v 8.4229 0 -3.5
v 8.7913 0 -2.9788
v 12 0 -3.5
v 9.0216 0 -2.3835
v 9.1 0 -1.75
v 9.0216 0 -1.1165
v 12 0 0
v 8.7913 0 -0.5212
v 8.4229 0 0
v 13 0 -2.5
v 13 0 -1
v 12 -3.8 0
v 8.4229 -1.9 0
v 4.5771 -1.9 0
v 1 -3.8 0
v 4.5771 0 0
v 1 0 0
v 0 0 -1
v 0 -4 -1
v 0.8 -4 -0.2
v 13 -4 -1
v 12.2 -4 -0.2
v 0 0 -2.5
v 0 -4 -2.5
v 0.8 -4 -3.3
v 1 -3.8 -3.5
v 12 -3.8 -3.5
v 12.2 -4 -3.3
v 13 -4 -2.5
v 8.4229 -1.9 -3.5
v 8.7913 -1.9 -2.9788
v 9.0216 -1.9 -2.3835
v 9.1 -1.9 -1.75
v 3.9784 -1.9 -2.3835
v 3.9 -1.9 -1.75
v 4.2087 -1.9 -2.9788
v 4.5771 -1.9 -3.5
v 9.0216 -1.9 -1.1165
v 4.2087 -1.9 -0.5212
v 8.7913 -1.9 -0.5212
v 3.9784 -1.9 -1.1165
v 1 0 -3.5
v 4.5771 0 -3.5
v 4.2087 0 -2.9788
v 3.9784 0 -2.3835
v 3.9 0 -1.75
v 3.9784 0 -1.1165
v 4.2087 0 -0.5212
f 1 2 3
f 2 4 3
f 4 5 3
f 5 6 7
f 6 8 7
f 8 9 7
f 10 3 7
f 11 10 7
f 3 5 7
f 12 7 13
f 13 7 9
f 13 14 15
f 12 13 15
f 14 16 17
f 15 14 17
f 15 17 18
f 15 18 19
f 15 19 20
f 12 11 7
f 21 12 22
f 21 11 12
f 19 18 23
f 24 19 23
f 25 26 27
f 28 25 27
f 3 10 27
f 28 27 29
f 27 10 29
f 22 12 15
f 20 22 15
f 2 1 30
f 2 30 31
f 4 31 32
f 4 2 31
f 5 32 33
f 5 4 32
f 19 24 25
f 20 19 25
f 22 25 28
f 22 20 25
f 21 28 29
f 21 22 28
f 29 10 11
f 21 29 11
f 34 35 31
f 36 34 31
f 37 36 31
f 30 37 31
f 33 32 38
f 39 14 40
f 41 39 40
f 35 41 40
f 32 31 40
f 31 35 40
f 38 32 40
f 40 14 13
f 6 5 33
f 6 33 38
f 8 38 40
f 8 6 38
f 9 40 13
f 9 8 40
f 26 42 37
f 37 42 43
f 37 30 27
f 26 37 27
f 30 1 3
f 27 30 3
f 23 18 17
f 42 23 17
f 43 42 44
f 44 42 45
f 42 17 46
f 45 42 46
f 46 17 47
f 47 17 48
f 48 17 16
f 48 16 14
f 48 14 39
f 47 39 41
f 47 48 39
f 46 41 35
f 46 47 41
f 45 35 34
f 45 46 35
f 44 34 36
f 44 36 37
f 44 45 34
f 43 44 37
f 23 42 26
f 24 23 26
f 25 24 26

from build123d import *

# Parameters (mm, degrees)
F1_DEPTH = 4
F2_DEPTH = 1.9
F3_SIZE  = 1
F4_SIZE  = 0.2


with BuildPart() as f1:
    # F0 (on Front) → F1 (new body)
    with BuildSketch(Plane.XZ):
        with BuildLine():
            Line((4.5771115477, 0), (0, 0))
            Line((0, 0), (0, -3.5))
            Line((0, -3.5), (4.5771115477, -3.5))
            ThreePointArc((4.5771115477, -3.5), (3.9, -1.75), (4.5771115477, 0))
        make_face()
        with BuildLine():
            Line((8.4228884523, 0), (4.5771115477, 0))
            ThreePointArc((4.5771115477, 0), (3.9, -1.75), (4.5771115477, -3.5))
            Line((4.5771115477, -3.5), (8.4228884523, -3.5))
            ThreePointArc((8.4228884523, -3.5), (8.9248206094, -2.6882137347), (9.1, -1.75))
            ThreePointArc((9.1, -1.75), (8.9248206094, -0.8117862653), (8.4228884523, 0))
        make_face()
        with BuildLine():
            Line((13, 0), (8.4228884523, 0))
            ThreePointArc((8.4228884523, 0), (8.9248206094, -0.8117862653), (9.1, -1.75))
            ThreePointArc((9.1, -1.75), (8.9248206094, -2.6882137347), (8.4228884523, -3.5))
            Line((8.4228884523, -3.5), (13, -3.5))
            Line((13, -3.5), (13, 0))
        make_face()
    extrude(amount=F1_DEPTH)

    # F0 (on Front) → F2 (cut)
    with BuildSketch(Plane.XZ):
        with BuildLine():
            Line((8.4228884523, 0), (4.5771115477, 0))
            ThreePointArc((4.5771115477, 0), (3.9, -1.75), (4.5771115477, -3.5))
            Line((4.5771115477, -3.5), (8.4228884523, -3.5))
            ThreePointArc((8.4228884523, -3.5), (8.9248206094, -2.6882137347), (9.1, -1.75))
            ThreePointArc((9.1, -1.75), (8.9248206094, -0.8117862653), (8.4228884523, 0))
        make_face()
    extrude(amount=F2_DEPTH, mode=Mode.SUBTRACT)

    # F3
    f3_edges = [f1.edges().sort_by_distance(p)[0] for p in [
        (13, -2, -3.5),
        (13, -2, 0),
        (0, -2, -3.5),
        (0, -2, 0),
    ]]
    chamfer(f3_edges, length=F3_SIZE)

    # F4
    f4_edges = [f1.edges().sort_by_distance(p)[0] for p in [
        (6.5, -4, -3.5),
        (6.5, -4, 0),
    ]]
    chamfer(f4_edges, length=F4_SIZE)


solid = f1.part
